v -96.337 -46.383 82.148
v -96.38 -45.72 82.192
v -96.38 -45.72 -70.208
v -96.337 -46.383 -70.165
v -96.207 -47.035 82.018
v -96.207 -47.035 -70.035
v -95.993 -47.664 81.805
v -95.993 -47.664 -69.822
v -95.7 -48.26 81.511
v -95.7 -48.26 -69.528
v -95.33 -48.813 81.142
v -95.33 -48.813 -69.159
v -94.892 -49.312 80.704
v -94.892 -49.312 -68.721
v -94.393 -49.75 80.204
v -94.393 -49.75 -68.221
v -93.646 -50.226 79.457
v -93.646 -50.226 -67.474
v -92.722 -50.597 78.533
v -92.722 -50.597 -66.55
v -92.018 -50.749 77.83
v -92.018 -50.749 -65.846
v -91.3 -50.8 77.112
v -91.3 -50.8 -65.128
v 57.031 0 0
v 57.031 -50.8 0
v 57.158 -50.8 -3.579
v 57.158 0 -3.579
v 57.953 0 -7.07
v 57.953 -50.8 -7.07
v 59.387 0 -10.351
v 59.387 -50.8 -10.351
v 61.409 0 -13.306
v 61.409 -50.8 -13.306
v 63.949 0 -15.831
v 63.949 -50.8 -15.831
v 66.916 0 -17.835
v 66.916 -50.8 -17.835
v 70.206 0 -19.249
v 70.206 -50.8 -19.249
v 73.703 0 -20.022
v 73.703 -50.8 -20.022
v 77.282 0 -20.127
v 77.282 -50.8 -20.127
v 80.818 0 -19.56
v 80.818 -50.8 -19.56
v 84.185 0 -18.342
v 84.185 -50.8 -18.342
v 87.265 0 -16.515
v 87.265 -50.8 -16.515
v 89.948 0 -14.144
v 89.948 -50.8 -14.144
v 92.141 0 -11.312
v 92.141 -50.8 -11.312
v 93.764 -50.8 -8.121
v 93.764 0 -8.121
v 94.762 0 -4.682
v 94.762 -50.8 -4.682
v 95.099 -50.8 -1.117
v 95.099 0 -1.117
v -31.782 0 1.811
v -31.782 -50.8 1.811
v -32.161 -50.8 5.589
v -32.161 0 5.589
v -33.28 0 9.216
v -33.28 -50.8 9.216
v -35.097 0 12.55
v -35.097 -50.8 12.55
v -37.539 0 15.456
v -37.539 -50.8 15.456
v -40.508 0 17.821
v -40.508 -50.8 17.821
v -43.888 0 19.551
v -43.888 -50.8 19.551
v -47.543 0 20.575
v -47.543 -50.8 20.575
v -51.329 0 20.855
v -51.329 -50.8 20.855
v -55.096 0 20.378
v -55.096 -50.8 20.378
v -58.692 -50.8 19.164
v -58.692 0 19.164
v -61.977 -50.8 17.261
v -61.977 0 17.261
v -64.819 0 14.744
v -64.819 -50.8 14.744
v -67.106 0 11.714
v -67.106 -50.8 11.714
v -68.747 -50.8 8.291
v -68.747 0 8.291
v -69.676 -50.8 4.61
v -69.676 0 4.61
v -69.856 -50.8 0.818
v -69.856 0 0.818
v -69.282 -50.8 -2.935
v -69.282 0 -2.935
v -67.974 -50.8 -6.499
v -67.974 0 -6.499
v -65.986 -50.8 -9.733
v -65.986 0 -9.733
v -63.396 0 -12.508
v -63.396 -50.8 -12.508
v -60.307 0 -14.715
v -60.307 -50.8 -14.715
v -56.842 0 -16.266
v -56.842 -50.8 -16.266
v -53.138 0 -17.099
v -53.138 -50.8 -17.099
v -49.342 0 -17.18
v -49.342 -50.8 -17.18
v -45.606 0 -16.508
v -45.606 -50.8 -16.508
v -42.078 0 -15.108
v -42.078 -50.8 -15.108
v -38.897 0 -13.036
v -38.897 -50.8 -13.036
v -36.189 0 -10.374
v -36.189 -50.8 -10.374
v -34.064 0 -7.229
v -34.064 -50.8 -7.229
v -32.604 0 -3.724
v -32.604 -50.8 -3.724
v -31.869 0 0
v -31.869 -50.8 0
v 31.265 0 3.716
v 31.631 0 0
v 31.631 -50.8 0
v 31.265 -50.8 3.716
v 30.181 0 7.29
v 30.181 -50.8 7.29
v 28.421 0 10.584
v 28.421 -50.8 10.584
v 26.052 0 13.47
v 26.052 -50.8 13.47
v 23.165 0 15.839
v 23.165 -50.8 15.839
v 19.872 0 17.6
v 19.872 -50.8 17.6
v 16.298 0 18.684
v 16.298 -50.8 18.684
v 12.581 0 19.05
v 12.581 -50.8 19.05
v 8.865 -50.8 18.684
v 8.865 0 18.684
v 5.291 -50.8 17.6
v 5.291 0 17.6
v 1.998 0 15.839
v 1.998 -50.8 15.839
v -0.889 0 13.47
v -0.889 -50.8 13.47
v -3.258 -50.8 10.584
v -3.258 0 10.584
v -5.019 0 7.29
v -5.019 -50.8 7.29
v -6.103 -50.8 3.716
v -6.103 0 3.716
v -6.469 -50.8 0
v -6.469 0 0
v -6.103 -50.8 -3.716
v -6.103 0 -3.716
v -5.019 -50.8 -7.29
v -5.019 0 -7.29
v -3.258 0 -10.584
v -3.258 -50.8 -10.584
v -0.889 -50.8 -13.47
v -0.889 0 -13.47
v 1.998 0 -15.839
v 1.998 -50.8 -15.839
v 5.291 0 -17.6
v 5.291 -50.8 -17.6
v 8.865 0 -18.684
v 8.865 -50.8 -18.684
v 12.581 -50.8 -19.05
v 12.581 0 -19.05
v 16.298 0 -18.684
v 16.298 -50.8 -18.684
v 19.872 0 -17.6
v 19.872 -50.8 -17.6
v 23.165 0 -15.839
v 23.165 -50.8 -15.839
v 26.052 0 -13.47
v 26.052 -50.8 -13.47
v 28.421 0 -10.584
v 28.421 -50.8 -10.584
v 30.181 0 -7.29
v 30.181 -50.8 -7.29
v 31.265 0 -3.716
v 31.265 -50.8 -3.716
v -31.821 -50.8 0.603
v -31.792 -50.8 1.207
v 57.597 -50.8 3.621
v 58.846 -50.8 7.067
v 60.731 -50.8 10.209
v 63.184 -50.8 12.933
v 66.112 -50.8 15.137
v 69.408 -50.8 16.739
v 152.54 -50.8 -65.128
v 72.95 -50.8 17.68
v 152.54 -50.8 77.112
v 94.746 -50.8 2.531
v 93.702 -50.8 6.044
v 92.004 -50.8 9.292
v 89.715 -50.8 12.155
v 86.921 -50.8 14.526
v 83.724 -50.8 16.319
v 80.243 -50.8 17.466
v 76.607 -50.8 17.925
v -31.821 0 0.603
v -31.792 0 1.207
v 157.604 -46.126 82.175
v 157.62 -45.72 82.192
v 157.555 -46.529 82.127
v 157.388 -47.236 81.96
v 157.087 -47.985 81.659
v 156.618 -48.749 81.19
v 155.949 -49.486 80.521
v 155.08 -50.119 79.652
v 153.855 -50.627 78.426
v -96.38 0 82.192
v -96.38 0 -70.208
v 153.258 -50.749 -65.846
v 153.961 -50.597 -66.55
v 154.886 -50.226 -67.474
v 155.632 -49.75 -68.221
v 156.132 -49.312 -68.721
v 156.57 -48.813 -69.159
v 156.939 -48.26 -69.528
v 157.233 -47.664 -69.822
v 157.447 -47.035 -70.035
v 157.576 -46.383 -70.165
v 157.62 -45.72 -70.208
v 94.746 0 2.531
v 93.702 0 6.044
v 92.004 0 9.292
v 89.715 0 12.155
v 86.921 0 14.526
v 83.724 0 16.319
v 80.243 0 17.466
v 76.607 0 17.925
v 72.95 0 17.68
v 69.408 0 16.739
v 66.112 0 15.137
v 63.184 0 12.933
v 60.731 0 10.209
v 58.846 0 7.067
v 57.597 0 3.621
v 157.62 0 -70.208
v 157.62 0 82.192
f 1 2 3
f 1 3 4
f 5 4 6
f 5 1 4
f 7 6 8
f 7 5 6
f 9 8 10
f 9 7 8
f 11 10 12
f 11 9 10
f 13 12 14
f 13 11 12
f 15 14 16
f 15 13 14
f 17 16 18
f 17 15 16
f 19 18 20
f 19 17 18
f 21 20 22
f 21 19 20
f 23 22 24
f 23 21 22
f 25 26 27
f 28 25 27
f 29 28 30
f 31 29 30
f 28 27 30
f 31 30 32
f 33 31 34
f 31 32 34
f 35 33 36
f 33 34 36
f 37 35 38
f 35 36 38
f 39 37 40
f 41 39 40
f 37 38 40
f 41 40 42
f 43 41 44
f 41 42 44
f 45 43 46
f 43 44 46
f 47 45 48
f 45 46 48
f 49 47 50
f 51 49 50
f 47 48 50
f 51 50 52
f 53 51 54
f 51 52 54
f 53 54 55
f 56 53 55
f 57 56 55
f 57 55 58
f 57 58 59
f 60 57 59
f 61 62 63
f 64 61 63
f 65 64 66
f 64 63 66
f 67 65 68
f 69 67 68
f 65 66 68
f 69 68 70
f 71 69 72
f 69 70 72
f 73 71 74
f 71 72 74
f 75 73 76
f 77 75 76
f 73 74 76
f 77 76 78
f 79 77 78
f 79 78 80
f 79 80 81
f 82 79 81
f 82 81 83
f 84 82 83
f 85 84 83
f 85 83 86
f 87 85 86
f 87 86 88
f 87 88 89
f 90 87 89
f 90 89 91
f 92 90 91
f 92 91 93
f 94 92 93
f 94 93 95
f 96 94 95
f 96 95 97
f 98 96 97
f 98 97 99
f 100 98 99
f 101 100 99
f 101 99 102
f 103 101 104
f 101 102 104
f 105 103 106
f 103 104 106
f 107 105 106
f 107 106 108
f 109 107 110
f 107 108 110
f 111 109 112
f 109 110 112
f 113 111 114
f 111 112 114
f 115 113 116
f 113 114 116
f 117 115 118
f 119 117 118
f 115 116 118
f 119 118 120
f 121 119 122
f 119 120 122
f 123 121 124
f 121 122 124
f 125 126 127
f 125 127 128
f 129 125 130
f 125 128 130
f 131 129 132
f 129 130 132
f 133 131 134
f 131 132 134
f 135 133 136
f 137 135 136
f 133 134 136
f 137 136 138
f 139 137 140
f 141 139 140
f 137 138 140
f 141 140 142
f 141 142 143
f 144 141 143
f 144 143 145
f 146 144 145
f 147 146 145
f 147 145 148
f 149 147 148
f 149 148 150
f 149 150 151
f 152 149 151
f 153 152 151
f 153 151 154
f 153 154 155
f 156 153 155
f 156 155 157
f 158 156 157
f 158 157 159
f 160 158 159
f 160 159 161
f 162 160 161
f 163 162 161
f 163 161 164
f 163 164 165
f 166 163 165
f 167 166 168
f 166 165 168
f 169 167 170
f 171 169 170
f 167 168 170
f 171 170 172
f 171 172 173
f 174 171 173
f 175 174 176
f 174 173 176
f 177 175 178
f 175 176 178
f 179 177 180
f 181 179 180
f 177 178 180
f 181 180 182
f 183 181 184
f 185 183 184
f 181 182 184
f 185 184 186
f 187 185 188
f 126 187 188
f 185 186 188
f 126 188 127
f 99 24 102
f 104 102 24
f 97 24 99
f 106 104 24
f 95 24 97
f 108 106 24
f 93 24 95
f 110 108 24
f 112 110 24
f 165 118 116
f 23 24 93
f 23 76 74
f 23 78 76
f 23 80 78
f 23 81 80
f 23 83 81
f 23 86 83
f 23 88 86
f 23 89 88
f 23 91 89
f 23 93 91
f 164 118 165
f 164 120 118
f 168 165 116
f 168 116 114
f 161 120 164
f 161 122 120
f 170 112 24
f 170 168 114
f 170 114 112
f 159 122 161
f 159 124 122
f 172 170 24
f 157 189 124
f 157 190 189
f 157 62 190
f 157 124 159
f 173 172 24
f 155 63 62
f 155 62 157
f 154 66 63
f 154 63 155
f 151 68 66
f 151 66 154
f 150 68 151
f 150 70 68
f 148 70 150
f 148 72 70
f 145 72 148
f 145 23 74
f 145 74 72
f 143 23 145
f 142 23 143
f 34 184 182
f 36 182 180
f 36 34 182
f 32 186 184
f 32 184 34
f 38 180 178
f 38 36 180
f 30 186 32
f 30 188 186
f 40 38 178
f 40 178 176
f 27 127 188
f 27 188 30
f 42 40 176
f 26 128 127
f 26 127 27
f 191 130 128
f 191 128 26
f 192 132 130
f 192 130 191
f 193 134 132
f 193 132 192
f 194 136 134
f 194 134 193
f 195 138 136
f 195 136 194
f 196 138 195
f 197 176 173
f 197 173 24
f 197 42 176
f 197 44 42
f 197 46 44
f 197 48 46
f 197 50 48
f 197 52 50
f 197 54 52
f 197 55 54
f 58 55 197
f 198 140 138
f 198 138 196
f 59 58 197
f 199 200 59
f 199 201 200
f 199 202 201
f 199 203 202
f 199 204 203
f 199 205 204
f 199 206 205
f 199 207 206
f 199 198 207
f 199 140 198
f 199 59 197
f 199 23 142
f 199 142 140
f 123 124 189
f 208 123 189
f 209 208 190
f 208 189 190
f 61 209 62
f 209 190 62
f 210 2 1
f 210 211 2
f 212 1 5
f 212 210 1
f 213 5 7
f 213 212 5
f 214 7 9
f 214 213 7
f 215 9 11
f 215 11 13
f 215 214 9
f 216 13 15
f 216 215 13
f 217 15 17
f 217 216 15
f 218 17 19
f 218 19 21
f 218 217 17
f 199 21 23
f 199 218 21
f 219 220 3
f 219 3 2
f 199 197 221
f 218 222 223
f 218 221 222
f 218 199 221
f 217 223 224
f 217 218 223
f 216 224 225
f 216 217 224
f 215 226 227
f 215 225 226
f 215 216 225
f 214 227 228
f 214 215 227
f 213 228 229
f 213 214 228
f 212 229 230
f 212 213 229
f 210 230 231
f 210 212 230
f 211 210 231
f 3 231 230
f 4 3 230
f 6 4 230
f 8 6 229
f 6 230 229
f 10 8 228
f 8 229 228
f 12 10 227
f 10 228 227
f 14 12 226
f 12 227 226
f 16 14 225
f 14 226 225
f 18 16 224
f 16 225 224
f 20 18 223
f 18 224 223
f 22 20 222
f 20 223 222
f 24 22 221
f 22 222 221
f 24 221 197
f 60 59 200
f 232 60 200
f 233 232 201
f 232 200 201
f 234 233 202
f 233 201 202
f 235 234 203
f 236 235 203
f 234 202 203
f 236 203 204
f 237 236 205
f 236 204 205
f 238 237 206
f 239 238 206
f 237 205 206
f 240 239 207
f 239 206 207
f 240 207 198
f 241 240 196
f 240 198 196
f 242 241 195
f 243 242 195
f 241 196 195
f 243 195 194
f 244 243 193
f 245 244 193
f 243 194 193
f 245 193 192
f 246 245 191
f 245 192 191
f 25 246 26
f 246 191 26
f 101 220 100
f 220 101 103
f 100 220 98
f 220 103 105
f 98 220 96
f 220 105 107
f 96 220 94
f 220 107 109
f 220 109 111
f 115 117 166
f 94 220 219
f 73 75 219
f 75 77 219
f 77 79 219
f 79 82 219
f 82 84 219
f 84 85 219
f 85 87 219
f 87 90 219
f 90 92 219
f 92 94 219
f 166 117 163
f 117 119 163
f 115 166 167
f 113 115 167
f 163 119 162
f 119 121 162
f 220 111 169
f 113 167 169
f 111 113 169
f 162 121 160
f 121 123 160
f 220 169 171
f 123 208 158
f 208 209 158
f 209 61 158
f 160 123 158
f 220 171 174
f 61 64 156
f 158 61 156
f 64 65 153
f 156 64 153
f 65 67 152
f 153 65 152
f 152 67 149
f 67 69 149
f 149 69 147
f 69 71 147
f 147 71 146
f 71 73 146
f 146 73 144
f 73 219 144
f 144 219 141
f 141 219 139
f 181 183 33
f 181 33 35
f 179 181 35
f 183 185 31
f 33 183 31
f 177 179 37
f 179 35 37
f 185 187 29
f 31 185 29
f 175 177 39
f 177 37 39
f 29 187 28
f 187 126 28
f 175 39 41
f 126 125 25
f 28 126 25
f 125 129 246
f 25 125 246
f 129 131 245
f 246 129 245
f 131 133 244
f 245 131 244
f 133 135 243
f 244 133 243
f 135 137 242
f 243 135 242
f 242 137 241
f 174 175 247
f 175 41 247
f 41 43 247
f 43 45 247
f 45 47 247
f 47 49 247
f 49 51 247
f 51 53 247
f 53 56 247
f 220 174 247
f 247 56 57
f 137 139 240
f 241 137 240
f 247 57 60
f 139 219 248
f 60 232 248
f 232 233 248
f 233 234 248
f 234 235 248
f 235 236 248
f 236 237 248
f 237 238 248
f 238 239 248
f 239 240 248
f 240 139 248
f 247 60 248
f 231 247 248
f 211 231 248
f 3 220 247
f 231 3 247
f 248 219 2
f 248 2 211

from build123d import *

# Parameters (mm, degrees)
F0_W     = 254
F0_H     = 152.4
F1_DEPTH = 50.8
F3_DEPTH = 123.19
F4_R     = 5.08


with BuildPart() as f1:
    # F0 (on Front) → F1 (new body)
    with BuildSketch(Plane.XZ):
        with Locations((30.619834, 5.991532)):
            Rectangle(F0_W, F0_H)
    extrude(amount=F1_DEPTH)

    # F2 (on face) → F3 (cut)
    with BuildSketch(Plane.XZ.offset(50.8)):
        with BuildLine():
            ThreePointArc((-6.468596, 0), (12.581404, -19.05), (31.631404, 0))
            ThreePointArc((31.631404, 0), (12.581404, 19.05), (-6.468596, 0))
        make_face()
        with BuildLine():
            ThreePointArc((-31.782277, 1.811433), (-69.860685, 2.718177), (-31.868596, 0))
            ThreePointArc((-31.868596, 0), (-31.803869, 0.904689), (-31.782277, 1.811433))
        make_face()
        with BuildLine():
            ThreePointArc((95.098651, -1.116608), (76.607195, 17.925202), (57.031404, 0))
            ThreePointArc((57.031404, 0), (75.490107, -20.158418), (95.098651, -1.116608))
        make_face()
    extrude(amount=-F3_DEPTH, mode=Mode.SUBTRACT)

    # F4
    f4_edges = [f1.edges().sort_by_distance(p)[0] for p in [
        (30.619834, -50.8, -70.208468),
        (157.619834, -50.8, 5.991532),
        (30.619834, -50.8, 82.191532),
        (-96.380166, -50.8, 5.991532),
    ]]
    fillet(f4_edges, radius=F4_R)


solid = f1.part
